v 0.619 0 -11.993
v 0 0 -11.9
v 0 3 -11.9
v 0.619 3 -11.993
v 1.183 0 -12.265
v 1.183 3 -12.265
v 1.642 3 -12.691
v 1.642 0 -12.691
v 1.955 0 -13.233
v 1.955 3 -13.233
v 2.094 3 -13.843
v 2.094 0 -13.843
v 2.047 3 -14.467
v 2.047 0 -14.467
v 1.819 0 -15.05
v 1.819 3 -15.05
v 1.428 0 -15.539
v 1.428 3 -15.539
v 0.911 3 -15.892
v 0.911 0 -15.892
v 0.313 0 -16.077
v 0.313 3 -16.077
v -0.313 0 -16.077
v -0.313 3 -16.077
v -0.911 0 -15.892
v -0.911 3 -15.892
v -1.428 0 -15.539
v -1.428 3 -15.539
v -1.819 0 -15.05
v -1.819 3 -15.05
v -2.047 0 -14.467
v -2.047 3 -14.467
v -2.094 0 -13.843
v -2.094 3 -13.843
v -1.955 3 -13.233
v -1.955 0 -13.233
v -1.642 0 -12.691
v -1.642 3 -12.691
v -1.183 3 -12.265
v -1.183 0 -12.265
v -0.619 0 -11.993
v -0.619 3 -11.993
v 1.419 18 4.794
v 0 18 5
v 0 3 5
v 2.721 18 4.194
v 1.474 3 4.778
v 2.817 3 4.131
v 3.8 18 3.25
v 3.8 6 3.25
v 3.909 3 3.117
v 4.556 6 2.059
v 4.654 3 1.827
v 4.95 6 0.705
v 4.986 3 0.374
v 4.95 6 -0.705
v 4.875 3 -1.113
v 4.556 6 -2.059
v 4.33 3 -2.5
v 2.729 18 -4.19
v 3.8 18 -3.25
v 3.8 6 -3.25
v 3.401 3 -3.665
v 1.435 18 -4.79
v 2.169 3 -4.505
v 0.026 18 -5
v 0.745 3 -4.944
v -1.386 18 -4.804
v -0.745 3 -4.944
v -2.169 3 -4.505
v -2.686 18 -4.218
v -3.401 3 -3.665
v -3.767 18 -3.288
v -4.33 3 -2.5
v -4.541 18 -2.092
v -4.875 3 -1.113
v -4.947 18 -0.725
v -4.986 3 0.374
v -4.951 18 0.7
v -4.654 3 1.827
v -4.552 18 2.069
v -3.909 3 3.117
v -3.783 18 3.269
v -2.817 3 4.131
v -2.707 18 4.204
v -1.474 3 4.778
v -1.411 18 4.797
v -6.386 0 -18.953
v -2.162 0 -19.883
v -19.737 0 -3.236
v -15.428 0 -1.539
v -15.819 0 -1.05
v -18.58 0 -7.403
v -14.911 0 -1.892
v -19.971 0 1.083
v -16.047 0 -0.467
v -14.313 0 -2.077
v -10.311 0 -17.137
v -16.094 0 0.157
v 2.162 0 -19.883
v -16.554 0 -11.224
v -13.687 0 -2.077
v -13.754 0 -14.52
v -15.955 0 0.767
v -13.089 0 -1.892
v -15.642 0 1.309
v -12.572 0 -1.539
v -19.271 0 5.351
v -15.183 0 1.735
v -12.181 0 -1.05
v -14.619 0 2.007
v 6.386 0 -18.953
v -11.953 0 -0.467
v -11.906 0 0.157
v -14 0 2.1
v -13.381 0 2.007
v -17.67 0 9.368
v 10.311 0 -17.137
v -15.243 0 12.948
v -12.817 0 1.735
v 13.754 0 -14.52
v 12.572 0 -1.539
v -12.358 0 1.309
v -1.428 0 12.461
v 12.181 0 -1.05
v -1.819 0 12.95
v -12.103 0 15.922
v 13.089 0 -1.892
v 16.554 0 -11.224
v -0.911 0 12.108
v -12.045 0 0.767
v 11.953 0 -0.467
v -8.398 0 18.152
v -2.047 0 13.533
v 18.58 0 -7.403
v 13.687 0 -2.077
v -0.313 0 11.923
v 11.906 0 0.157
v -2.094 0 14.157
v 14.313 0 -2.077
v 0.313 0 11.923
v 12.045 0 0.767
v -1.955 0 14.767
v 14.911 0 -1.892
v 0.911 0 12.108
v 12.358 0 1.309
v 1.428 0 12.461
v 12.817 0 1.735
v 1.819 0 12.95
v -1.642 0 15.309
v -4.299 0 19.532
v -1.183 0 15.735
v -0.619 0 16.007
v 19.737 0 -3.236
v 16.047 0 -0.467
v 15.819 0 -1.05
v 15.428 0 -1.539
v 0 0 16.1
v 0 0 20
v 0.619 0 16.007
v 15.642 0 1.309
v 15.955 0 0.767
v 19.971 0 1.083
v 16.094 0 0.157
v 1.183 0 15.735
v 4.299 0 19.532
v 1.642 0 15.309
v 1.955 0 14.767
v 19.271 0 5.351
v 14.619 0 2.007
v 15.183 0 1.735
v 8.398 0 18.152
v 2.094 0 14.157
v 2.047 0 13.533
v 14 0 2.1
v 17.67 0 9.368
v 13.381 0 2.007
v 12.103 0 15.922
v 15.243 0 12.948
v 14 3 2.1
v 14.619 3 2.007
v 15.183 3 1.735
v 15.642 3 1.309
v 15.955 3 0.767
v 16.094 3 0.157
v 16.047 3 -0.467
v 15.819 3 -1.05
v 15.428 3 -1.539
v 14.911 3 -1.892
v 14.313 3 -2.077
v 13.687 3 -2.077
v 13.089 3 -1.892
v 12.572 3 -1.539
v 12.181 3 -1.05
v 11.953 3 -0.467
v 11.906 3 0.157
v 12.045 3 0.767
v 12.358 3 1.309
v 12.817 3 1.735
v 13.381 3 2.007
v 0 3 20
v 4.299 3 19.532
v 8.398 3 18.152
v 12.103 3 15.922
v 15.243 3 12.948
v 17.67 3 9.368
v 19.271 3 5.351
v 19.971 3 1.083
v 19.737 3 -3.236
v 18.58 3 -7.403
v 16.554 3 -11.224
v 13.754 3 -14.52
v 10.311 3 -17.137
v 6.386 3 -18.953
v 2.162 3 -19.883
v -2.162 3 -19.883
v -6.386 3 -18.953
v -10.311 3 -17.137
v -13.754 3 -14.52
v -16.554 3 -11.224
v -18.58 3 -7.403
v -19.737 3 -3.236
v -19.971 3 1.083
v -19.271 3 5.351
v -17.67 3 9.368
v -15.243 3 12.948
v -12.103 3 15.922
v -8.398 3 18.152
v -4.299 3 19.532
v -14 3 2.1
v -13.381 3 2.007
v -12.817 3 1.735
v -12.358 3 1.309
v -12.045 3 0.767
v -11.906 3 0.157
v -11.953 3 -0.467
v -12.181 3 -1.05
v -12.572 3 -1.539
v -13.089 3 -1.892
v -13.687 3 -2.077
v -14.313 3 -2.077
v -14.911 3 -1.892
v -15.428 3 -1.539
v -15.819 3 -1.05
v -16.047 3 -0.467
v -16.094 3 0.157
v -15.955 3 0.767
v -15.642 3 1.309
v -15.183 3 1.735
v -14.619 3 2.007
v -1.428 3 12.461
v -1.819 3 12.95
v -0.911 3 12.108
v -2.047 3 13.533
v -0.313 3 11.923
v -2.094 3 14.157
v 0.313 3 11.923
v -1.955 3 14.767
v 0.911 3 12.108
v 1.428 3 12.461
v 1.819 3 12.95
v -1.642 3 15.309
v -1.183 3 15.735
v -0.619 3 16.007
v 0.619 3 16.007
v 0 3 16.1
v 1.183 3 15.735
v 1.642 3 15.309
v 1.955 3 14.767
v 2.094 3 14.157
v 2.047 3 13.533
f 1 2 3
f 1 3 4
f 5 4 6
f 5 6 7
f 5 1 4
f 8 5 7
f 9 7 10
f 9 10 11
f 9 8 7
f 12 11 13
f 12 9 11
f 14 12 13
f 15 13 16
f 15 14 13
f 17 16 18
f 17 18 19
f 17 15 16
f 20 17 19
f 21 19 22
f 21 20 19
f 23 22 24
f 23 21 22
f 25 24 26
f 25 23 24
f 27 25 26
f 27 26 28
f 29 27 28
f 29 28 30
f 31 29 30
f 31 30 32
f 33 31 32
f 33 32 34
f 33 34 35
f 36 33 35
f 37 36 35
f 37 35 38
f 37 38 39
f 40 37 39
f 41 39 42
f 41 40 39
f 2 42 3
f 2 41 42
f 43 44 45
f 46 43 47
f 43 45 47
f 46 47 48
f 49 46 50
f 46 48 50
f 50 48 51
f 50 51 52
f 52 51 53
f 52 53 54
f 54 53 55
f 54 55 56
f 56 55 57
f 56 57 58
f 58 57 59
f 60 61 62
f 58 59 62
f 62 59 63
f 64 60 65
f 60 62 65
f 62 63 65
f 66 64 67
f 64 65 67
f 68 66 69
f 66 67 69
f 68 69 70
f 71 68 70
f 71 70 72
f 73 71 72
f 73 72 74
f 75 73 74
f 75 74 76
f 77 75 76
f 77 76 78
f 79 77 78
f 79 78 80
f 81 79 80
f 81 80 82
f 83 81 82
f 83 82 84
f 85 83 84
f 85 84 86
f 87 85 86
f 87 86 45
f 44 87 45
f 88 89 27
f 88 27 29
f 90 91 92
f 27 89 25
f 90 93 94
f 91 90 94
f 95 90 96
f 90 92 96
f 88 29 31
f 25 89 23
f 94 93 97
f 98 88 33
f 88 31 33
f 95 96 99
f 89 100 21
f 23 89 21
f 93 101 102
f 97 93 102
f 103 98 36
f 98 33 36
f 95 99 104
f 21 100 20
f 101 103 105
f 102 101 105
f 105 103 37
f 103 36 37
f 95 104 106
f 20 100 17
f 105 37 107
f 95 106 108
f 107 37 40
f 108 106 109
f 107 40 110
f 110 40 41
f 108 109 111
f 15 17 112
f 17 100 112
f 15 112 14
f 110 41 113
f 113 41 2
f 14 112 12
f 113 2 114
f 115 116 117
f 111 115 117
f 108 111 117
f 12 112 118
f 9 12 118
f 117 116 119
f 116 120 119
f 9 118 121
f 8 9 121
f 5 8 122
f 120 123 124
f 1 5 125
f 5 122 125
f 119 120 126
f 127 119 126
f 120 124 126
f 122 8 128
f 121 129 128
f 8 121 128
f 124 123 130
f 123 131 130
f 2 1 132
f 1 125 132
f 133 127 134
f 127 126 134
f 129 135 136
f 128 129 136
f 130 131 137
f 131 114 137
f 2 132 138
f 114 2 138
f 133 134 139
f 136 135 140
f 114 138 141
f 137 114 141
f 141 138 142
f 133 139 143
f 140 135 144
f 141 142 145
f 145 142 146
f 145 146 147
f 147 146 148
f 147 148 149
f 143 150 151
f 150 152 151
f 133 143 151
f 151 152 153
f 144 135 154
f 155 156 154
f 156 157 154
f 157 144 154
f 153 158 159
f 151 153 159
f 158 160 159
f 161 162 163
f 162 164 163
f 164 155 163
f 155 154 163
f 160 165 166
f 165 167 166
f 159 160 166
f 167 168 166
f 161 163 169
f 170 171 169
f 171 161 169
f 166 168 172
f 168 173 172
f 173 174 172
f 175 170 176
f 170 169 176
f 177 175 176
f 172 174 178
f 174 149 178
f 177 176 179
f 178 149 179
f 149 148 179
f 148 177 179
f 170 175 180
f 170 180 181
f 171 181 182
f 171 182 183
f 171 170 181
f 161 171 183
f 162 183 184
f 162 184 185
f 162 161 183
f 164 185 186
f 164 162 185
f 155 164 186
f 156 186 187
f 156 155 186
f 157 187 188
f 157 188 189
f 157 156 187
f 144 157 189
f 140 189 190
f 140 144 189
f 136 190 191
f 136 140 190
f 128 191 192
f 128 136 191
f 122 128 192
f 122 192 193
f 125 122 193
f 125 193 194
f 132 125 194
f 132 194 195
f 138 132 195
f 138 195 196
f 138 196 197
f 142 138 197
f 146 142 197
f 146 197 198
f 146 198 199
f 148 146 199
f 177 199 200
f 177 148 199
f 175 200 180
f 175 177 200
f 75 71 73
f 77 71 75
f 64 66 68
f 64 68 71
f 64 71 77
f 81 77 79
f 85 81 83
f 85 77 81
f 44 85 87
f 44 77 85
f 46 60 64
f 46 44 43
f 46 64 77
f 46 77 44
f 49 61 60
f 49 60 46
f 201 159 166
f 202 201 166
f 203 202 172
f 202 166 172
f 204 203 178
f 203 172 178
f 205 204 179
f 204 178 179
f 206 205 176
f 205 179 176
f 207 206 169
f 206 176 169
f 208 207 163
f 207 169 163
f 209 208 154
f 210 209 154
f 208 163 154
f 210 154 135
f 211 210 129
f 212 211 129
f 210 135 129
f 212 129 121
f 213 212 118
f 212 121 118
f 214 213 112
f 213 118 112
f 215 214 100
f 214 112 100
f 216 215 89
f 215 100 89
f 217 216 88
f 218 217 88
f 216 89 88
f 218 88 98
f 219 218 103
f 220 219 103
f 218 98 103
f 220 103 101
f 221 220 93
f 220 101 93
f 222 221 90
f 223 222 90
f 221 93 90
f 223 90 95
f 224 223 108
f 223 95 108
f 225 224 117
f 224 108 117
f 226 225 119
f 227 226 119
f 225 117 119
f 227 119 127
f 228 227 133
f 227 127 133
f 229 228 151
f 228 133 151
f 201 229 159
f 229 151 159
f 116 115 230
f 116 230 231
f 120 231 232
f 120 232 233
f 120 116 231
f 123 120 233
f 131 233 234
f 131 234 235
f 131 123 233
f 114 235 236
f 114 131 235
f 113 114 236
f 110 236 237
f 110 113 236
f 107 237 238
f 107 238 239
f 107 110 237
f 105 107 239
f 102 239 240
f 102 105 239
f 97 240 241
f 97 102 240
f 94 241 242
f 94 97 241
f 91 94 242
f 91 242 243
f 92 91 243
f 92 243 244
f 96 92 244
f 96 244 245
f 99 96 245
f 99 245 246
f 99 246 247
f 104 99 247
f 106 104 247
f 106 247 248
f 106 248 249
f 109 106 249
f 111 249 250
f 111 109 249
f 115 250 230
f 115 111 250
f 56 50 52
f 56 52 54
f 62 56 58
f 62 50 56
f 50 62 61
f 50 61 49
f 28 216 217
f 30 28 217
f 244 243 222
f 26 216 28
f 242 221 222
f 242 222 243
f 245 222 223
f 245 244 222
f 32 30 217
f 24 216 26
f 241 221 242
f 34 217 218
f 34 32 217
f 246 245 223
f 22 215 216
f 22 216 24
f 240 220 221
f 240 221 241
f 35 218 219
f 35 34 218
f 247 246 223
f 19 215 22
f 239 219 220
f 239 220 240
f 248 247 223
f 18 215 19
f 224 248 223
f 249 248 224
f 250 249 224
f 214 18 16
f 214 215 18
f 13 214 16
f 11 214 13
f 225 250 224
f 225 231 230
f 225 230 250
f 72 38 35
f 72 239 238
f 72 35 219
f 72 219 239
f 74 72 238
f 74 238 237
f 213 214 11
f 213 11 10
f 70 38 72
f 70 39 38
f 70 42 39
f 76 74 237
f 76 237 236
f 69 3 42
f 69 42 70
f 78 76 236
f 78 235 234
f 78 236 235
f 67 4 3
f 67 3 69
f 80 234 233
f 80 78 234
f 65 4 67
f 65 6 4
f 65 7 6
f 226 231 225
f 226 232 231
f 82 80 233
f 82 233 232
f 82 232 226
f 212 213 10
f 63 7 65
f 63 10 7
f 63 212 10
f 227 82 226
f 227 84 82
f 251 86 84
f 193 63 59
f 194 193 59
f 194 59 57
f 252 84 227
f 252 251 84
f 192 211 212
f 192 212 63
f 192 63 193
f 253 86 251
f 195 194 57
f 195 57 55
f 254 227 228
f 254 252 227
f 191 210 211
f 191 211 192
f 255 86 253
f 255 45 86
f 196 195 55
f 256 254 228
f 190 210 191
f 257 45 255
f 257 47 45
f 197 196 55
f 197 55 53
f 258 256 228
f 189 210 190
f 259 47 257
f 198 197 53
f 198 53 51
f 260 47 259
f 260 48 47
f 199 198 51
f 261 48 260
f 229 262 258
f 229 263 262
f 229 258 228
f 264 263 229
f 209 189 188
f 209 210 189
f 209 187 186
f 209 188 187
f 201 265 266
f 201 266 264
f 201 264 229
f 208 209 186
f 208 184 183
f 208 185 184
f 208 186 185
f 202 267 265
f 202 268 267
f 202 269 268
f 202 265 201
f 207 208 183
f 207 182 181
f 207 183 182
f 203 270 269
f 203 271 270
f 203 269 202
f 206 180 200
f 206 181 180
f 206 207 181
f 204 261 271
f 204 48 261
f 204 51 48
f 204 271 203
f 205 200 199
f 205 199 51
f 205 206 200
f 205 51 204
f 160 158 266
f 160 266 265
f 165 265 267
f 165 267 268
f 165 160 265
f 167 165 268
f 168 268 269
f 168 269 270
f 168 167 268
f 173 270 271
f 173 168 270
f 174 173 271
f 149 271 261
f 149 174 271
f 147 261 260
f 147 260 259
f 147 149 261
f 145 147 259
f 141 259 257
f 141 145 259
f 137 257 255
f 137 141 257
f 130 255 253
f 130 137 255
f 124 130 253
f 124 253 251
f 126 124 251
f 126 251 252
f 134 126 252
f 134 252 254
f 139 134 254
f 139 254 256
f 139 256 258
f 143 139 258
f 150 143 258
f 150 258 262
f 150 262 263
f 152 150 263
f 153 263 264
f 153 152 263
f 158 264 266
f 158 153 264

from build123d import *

# Parameters (mm, degrees)
SKETCH1_R           = 20
SKETCH1_R_2         = 2.1
BOSS_EXTRUDE1_DEPTH = 3
SKETCH2_R           = 5
BOSS_EXTRUDE2_DEPTH = 15
CUT_EXTRUDE1_START  = -12
CUT_EXTRUDE1_DEPTH  = 12


with BuildPart() as part:
    # Sketch1 → Boss-Extrude1 (new body)
    with BuildSketch(Plane(origin=(0, 0, 0), x_dir=(1, 0, 0), z_dir=(0, 1, 0))):
        with Locations(Location((0, 0, 0), (0, 0, 270))):
            Circle(SKETCH1_R)
        with Locations(Location((-14, 0, 0), (0, 0, 270))):
            Circle(SKETCH1_R_2, mode=Mode.SUBTRACT)
        with Locations(Location((0, 14, 0), (0, 0, 270))):
            Circle(SKETCH1_R_2, mode=Mode.SUBTRACT)
        with Locations(Location((14, 0, 0), (0, 0, 270))):
            Circle(SKETCH1_R_2, mode=Mode.SUBTRACT)
        with Locations(Location((0, -14, 0), (0, 0, 270))):
            Circle(SKETCH1_R_2, mode=Mode.SUBTRACT)
    extrude(amount=BOSS_EXTRUDE1_DEPTH)

    # Sketch2 → Boss-Extrude2 (add)
    with BuildSketch(Plane(origin=(0, 3, 0), x_dir=(1, 0, 0), z_dir=(0, 1, 0))):
        with Locations(Location((0, 0, 0), (0, 0, 270))):
            Circle(SKETCH2_R)
    extrude(amount=BOSS_EXTRUDE2_DEPTH)

    # Sketch3 → Cut-Extrude1 (cut)
    with BuildSketch(Plane(origin=(0, 18, 0), x_dir=(1, 0, 0), z_dir=(0, 1, 0)).offset(CUT_EXTRUDE1_START)):
        with BuildLine():
            Line((3.8, 3.249615362), (3.8, -3.249615362))
            ThreePointArc((3.8, -3.249615362), (5, 0), (3.8, 3.249615362))
        make_face()
    extrude(amount=CUT_EXTRUDE1_DEPTH, mode=Mode.SUBTRACT)


solid = part.part
